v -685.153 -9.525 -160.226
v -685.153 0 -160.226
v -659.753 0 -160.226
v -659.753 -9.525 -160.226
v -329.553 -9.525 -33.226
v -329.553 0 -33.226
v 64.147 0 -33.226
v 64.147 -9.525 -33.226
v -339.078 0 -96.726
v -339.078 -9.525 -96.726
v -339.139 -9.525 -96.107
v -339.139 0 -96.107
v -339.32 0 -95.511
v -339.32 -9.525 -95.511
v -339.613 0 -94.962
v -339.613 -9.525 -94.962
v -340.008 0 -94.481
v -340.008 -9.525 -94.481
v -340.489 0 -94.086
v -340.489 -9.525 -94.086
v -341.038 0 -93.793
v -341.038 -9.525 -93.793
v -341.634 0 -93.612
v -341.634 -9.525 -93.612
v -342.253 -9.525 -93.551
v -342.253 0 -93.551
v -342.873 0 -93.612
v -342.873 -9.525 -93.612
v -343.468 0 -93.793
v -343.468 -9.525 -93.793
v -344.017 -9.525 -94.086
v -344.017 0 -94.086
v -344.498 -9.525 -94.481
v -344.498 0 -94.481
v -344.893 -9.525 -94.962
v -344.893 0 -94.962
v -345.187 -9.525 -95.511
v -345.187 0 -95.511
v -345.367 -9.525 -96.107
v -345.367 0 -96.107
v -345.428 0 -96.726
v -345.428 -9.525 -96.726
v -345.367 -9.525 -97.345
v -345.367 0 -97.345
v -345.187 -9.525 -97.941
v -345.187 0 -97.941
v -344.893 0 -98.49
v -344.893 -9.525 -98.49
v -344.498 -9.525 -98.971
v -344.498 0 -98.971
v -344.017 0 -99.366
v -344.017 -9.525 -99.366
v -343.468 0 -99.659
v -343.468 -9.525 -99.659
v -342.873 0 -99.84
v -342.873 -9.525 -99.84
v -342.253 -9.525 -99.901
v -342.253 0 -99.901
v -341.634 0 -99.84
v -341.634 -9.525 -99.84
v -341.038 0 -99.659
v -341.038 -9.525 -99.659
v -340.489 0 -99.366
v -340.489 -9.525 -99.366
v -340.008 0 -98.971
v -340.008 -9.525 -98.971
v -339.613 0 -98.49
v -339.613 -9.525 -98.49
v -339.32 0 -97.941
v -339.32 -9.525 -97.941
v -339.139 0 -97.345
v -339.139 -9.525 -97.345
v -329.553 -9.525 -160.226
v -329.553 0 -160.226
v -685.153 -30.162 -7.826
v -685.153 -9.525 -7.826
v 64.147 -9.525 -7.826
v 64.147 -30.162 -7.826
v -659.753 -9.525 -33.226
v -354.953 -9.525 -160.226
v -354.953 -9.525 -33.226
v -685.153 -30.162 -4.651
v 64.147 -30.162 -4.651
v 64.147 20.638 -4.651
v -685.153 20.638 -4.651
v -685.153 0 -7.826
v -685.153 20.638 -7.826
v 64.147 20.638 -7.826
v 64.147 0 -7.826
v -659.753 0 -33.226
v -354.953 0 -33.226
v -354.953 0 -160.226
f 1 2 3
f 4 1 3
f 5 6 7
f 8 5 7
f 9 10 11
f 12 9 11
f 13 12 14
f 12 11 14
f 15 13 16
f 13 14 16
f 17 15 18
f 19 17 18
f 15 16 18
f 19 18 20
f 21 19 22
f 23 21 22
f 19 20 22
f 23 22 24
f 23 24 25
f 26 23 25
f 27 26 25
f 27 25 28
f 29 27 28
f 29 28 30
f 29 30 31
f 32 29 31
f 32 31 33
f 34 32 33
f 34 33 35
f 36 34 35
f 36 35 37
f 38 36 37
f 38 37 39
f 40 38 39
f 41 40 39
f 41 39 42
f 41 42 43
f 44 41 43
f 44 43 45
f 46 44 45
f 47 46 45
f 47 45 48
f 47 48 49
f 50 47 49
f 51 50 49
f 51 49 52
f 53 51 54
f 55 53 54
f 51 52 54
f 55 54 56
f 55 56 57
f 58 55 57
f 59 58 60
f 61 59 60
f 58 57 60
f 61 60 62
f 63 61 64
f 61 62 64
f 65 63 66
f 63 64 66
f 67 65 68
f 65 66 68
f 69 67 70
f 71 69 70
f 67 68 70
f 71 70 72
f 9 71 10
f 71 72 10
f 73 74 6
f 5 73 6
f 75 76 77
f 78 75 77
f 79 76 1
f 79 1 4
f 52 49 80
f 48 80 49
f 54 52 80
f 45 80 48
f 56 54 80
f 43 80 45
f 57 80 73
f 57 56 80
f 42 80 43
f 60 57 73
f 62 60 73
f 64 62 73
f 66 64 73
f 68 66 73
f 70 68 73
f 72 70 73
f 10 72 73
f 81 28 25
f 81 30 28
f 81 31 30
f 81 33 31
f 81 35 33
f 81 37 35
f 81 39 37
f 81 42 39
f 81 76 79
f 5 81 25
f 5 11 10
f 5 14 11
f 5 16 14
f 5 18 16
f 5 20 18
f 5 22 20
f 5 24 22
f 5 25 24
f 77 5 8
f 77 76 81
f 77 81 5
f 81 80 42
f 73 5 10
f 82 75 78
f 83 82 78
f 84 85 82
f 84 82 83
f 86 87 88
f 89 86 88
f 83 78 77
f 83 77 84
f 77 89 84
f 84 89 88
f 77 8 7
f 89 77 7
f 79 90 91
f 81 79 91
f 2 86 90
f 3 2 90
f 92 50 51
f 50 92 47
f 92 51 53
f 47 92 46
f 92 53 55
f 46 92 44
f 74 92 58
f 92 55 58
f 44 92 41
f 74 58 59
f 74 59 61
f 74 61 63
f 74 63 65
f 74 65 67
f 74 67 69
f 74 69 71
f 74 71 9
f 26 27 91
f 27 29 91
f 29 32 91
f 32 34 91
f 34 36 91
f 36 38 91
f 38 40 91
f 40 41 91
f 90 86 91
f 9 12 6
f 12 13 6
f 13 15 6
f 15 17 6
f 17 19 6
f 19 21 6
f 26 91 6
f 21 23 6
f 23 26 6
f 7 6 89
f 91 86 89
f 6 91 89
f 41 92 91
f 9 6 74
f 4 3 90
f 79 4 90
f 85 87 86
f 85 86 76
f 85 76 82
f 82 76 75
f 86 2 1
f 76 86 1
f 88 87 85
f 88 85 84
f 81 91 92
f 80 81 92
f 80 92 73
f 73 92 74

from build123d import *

# Parameters (mm, degrees)
F0_W     = 393.7
F0_H     = 25.4
F0_W_2   = 25.4
F0_H_2   = 127
F0_W_3   = 304.8
F1_DEPTH = 9.525
F2_W     = 749.3
F2_H     = 20.6375
F2_H_2   = 9.525
F3_DEPTH = 3.175
F4_R     = 3.175
F5_DEPTH = 30.1635


with BuildPart() as f1:
    # F0 (on Front) → F1 (new body)
    with BuildSketch(Plane.XZ):
        with Locations((-132.7033620834, -20.5259278297)):
            Rectangle(F0_W, F0_H)
        with Locations((-342.2533620834, -20.5259278297)):
            Rectangle(F0_W_2, F0_H)
        with Locations((-342.2533620834, -96.7259278297)):
            Rectangle(F0_W_2, F0_H_2)
        with Locations((-507.3533620834, -20.5259278297)):
            Rectangle(F0_W_3, F0_H)
        with Locations((-672.4533620834, -20.5259278297)):
            Rectangle(F0_W_2, F0_H)
        with Locations((-672.4533620834, -96.7259278297)):
            Rectangle(F0_W_2, F0_H_2)
    extrude(amount=F1_DEPTH)

    # F2 (on face) → F3 (join)
    with BuildSketch(Plane.XY.offset(-7.8259278297)):
        with Locations((-310.5033620834, 10.31875)):
            Rectangle(F2_W, F2_H)
        with Locations((-310.5033620834, -4.7625)):
            Rectangle(F2_W, F2_H_2)
        with Locations((-310.5033620834, -19.84375)):
            Rectangle(F2_W, F2_H)
    extrude(amount=F3_DEPTH)

    # F4 (on face) → F5 (cut, through all)
    with BuildSketch(Plane.XZ.offset(9.525)):
        with Locations((-342.2533620834, -96.7259278297)):
            Circle(F4_R)
    extrude(amount=-F5_DEPTH, mode=Mode.SUBTRACT)


solid = f1.part
